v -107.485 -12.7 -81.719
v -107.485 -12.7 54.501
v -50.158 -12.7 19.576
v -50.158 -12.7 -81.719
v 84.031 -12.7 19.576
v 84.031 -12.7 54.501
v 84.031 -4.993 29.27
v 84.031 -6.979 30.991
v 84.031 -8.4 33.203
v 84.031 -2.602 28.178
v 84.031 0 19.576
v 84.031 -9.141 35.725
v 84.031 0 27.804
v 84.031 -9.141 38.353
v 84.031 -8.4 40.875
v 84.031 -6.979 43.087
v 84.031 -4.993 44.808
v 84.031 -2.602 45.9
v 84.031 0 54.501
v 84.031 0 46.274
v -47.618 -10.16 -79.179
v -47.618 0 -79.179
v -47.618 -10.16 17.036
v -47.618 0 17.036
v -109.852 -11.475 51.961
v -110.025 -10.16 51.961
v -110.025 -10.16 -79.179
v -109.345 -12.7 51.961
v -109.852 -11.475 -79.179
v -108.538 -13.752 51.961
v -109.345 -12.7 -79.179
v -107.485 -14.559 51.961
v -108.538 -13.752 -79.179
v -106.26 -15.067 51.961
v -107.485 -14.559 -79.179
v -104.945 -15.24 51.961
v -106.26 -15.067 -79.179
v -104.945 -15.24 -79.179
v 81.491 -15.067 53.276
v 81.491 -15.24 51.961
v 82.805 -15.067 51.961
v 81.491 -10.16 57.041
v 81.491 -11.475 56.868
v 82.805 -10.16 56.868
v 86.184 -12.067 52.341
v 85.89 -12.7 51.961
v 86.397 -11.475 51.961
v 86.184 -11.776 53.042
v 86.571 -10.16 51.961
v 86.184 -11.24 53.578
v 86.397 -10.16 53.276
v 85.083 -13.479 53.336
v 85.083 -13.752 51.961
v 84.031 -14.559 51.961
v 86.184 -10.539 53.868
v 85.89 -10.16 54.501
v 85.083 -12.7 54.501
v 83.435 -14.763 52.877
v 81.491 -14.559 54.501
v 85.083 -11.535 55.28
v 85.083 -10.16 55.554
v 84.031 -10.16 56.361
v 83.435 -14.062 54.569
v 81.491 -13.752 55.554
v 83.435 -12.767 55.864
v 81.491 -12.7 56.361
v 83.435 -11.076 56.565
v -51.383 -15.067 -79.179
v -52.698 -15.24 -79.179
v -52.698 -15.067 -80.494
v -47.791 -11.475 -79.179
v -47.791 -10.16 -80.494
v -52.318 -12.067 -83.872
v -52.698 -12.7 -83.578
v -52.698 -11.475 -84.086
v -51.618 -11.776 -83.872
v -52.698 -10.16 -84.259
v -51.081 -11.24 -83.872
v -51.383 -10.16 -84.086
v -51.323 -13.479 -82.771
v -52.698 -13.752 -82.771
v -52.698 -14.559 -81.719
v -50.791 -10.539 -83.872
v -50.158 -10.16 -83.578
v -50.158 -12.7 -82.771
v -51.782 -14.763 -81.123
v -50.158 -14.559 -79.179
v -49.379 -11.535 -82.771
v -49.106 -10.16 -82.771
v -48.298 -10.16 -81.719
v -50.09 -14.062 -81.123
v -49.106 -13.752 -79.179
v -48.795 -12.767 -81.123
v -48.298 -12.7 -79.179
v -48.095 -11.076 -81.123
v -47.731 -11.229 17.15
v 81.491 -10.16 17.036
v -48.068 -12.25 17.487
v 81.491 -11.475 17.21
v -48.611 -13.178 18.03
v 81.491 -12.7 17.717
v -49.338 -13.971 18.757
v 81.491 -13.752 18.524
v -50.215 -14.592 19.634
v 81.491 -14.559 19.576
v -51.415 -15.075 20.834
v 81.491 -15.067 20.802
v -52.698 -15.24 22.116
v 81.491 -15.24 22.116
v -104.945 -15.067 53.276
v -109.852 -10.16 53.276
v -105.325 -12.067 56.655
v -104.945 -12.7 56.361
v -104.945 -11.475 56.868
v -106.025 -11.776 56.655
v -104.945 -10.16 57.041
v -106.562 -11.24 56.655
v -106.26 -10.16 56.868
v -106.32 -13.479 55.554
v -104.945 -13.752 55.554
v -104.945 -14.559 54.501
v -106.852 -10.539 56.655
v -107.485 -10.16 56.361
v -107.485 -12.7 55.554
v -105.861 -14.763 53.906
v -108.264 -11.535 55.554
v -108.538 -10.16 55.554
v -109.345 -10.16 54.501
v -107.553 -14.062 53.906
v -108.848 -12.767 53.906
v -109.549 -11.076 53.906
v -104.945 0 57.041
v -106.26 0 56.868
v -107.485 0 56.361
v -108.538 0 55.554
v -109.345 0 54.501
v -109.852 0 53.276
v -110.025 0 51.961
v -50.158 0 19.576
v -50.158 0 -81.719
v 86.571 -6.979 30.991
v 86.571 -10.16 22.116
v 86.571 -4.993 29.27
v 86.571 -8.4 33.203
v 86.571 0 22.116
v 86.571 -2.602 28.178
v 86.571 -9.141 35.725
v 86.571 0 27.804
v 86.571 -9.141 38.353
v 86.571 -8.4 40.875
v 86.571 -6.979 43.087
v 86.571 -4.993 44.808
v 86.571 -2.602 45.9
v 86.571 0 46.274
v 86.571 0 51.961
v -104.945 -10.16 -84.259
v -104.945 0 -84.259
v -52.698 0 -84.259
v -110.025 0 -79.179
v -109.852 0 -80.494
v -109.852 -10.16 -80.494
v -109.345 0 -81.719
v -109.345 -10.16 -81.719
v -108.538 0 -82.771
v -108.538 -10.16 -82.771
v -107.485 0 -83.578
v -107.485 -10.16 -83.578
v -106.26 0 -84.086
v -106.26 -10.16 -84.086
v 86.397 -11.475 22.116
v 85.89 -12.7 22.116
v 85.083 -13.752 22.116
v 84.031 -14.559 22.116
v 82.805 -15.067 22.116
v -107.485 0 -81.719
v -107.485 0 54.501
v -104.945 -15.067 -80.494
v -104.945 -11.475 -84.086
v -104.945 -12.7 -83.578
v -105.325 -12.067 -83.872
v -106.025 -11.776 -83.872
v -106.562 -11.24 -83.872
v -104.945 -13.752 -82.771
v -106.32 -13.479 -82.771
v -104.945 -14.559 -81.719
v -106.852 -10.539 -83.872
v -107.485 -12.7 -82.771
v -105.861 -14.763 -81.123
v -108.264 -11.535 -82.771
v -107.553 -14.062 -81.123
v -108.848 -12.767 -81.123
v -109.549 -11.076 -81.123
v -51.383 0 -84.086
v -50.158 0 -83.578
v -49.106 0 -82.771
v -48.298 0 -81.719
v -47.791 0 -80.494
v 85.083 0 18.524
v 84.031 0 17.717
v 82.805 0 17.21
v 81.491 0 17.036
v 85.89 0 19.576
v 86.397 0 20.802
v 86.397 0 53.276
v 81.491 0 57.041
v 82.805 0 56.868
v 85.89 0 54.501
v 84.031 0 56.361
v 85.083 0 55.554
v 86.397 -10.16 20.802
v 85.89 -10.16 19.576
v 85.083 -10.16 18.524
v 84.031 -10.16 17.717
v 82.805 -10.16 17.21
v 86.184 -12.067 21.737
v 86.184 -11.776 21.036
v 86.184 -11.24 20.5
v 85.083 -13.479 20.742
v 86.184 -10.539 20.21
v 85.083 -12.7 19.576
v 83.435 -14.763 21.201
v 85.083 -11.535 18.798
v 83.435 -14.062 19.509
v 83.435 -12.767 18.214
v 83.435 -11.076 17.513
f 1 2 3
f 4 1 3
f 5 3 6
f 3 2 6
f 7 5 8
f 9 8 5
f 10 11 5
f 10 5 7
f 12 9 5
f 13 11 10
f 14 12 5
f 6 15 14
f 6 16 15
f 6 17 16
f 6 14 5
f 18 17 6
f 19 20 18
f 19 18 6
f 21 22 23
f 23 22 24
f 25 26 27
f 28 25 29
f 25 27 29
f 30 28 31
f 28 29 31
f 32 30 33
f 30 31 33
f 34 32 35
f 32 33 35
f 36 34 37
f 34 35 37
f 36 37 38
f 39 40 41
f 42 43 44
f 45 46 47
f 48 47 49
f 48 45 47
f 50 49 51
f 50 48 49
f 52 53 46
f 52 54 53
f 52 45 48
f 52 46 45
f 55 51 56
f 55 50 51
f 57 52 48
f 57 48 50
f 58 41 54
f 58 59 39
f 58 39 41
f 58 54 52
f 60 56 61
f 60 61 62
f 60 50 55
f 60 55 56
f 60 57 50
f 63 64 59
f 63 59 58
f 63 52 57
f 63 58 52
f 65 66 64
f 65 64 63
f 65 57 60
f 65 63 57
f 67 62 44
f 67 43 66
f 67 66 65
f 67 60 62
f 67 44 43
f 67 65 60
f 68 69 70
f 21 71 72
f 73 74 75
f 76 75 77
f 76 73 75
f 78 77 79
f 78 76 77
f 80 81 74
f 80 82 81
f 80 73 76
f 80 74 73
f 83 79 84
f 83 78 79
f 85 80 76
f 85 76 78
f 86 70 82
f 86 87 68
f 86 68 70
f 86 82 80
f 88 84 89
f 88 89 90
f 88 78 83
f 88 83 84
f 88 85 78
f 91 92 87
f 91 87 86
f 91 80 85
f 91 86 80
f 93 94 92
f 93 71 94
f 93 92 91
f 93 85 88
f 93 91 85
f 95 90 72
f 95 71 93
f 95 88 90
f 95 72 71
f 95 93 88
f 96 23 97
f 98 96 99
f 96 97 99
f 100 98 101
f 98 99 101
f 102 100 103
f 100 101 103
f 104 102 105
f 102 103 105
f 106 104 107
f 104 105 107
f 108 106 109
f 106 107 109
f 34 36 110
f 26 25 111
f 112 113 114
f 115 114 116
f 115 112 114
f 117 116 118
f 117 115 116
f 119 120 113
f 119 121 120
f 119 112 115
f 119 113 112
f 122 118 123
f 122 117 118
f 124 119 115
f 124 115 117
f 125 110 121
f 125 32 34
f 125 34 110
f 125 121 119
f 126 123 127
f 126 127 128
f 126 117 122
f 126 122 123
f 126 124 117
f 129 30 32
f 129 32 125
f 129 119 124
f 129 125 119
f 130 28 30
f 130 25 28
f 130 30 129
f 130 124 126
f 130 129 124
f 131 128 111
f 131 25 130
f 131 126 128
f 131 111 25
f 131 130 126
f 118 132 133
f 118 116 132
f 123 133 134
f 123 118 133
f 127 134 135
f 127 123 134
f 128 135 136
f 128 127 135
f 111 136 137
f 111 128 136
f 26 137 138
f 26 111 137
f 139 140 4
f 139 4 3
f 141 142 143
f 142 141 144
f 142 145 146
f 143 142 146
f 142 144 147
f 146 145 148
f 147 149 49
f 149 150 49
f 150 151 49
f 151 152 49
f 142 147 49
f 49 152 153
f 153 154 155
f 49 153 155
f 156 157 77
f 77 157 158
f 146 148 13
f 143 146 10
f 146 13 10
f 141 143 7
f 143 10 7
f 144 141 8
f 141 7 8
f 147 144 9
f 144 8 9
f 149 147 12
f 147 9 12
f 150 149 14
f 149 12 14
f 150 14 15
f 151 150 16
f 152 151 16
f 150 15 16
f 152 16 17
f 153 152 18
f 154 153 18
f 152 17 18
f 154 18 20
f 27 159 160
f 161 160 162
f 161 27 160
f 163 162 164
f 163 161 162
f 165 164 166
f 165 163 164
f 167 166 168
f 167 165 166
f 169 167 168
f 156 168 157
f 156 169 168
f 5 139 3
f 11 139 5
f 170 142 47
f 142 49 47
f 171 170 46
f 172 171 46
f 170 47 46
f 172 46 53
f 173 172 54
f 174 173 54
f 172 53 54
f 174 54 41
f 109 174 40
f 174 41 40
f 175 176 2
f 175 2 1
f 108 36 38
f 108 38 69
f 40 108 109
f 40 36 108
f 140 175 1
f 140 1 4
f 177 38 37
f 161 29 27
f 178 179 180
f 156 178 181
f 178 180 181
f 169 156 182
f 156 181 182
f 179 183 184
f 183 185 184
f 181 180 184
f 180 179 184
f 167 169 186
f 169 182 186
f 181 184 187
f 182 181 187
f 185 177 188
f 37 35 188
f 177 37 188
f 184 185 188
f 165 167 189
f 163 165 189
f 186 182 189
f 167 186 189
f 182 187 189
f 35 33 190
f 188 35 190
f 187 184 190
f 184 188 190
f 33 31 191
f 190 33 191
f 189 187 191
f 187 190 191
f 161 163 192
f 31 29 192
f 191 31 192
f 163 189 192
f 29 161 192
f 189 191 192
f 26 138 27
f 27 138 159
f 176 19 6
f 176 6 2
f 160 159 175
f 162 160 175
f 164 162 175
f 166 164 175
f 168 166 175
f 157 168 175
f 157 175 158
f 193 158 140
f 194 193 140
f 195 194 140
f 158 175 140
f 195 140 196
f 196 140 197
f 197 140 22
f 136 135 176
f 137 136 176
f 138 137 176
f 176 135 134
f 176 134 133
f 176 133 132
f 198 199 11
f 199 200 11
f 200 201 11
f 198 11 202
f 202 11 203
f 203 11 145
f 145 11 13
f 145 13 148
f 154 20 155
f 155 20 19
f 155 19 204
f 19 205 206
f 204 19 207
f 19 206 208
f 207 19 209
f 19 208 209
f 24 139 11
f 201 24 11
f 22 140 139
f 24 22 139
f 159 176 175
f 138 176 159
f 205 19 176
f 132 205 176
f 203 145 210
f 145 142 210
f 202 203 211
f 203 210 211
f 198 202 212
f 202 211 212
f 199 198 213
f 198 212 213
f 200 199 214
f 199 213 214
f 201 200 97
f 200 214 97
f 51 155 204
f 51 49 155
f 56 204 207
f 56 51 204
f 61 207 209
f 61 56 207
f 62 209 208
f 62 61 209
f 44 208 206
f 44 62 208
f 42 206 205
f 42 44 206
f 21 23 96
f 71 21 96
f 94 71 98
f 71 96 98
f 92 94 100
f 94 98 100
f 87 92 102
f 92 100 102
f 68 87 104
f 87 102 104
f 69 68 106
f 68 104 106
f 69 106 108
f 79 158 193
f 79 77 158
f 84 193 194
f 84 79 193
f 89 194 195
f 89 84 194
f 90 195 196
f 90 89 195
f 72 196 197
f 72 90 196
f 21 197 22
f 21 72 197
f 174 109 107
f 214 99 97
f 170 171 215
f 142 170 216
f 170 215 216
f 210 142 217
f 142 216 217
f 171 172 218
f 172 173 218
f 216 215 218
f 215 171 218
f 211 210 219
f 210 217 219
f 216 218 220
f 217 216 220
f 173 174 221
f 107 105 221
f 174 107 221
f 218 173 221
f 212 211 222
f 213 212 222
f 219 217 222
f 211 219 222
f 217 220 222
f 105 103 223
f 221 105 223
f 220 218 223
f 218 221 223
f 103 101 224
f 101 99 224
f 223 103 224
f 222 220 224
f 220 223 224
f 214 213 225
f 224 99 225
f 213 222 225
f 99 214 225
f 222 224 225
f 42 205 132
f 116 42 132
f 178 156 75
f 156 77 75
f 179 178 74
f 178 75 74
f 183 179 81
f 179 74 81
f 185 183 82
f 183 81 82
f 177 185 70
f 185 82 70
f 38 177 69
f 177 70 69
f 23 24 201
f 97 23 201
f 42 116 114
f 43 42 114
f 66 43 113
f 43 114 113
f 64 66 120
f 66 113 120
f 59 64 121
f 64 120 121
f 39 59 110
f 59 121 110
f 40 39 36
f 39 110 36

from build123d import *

# Parameters (mm, degrees)
F1_DEPTH = 15.24
F2_T     = -2.54
F3_R     = 5.08
F5_D     = 18.47
F5_DEPTH = 14
F5_TIP   = 5.5489478167


with BuildPart() as f1:
    # F0 (on Front) → F1 (new body)
    with BuildSketch(Plane.XZ):
        Polygon((86.5705514472, 17.0364904519), (86.5705514472, 57.0414904519), (-110.0254485528, 57.0414904519), (-110.0254485528, -84.2587095481), (-47.6176485528, -84.2587095481), (-47.6176485528, 17.0364904519), align=None)
    extrude(amount=F1_DEPTH)

    # F2
    f2_openings = [f1.faces().sort_by_distance(p)[0] for p in [
        (19.476451, 0, 19.457559),
    ]]
    offset(amount=F2_T, openings=f2_openings, kind=Kind.INTERSECTION)

    # F3
    f3_edges = [f1.edges().sort_by_distance(p)[0] for p in [
        (-110.025449, -15.24, -13.60861),
        (-47.617649, -15.24, -33.61111),
        (-78.821549, -15.24, -84.25871),
        (-110.025449, -7.62, -84.25871),
        (-11.727449, -15.24, 57.04149),
        (19.476451, -15.24, 17.03649),
        (-110.025449, -7.62, 57.04149),
        (86.570551, -15.24, 37.03899),
        (86.570551, -7.62, 57.04149),
        (86.570551, -7.62, 17.03649),
        (-47.617649, -7.62, -84.25871),
    ]]
    fillet(f3_edges, radius=F3_R)

    # F5
    with Locations(Plane.YZ.offset(86.5705514472)):
        with Locations((0, 37.0389904519)):
            Hole(F5_D / 2, depth=F5_DEPTH)
            with Locations((0, 0, -(F5_DEPTH + F5_TIP / 2))):  # 118° drill point
                Cone(0, F5_D / 2, F5_TIP, mode=Mode.SUBTRACT)


solid = f1.part
